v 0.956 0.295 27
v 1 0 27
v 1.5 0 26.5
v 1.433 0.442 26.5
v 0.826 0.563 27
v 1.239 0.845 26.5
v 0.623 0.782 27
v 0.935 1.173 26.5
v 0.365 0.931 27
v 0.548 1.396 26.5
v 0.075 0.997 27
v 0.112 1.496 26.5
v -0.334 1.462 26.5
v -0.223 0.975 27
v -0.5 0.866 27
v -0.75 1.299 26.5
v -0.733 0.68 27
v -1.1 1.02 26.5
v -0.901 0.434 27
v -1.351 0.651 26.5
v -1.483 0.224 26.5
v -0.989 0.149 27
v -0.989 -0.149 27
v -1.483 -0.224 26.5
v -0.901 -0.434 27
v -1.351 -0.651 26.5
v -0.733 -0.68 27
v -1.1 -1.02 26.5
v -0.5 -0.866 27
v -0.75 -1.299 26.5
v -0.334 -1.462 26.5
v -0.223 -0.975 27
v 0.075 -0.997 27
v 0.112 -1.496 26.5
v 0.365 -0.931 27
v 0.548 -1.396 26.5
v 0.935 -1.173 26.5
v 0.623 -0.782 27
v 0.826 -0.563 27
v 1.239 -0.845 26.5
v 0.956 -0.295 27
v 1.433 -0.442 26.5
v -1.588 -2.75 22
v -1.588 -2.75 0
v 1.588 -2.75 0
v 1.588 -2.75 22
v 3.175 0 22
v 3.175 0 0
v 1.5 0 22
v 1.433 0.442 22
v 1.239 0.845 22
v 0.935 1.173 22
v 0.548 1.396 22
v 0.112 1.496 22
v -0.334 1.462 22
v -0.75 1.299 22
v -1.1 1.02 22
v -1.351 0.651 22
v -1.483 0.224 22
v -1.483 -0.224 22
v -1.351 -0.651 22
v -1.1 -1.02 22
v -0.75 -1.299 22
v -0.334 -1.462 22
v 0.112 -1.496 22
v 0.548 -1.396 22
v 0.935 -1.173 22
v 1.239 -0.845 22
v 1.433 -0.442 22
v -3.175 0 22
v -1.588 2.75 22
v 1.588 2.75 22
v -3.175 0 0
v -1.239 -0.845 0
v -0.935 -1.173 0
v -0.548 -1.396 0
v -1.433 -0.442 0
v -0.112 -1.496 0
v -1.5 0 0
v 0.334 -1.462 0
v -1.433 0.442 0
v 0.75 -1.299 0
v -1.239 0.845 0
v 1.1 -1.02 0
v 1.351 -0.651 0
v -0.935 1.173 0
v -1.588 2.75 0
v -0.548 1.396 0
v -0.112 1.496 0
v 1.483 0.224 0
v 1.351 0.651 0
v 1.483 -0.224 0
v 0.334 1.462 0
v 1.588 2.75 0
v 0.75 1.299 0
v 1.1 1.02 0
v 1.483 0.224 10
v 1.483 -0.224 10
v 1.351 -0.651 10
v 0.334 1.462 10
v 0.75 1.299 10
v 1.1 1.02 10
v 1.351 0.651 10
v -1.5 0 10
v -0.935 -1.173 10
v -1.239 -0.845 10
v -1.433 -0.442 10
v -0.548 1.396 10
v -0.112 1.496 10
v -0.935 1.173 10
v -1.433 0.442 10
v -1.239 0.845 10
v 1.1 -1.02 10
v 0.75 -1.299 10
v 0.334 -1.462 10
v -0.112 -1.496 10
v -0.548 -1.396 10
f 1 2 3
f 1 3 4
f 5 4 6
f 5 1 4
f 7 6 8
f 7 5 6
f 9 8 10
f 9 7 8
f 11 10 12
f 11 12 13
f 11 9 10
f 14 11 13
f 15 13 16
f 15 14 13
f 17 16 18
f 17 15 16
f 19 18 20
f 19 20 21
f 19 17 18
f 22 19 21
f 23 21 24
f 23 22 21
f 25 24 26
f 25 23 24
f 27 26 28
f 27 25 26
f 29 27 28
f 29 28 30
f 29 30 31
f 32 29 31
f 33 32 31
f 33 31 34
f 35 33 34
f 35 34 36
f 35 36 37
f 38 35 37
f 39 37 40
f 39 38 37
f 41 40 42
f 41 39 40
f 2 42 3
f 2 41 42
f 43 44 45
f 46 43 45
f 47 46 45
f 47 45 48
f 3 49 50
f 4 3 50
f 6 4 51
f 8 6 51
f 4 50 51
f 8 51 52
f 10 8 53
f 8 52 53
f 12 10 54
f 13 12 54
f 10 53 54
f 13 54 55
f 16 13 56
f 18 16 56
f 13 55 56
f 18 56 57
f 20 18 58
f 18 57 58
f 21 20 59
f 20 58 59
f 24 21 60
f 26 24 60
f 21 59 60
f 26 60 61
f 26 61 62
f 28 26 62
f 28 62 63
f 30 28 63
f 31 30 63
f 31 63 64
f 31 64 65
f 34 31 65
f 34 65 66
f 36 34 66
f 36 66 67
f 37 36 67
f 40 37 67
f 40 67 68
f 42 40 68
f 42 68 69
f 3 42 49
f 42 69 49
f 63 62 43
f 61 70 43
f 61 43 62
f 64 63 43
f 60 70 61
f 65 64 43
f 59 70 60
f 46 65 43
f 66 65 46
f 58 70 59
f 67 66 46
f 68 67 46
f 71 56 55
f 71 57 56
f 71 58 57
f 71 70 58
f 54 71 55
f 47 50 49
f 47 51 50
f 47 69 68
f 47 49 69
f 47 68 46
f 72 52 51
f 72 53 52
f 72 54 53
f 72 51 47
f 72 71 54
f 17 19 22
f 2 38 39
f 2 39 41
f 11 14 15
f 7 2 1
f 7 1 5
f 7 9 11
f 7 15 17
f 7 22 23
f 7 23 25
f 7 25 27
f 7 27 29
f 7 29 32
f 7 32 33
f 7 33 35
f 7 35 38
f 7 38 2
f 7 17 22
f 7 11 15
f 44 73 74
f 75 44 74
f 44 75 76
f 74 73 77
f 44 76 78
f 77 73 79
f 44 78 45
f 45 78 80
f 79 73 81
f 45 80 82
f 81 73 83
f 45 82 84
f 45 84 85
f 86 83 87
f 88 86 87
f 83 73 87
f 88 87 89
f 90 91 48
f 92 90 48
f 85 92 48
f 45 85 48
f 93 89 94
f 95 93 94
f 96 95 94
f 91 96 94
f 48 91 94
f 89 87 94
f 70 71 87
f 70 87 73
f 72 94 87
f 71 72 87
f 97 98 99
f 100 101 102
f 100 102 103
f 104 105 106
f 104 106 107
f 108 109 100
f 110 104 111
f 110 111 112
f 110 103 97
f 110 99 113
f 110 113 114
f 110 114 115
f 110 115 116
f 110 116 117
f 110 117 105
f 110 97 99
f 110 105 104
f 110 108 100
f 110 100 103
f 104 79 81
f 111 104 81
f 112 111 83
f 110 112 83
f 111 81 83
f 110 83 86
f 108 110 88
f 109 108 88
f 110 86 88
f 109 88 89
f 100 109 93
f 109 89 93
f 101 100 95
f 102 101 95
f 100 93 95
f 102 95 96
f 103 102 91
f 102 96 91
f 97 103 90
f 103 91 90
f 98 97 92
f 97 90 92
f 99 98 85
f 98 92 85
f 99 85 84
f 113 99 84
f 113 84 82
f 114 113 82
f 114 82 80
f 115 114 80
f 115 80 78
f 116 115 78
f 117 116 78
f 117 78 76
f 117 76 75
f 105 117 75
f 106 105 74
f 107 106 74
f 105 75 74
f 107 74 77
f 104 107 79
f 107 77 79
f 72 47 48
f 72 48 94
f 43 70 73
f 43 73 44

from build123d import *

# Parameters (mm, degrees)
EXTRUDE_1_DEPTH     = 22
SKETCH_2_R          = 1.5
EXTRUDE_2_DEPTH     = 5
CHAMFER_1_SIZE      = 0.5
SKETCH_3_R          = 1.5
CUT_EXTRUDE_1_DEPTH = 10


with BuildPart() as part:
    # 草图1 → 凸台-拉伸1 (new body)
    with BuildSketch(Plane.XY):
        Polygon((3.175426481, 0), (1.58771324, 2.75), (-1.58771324, 2.75), (-3.175426481, 0), (-1.58771324, -2.75), (1.58771324, -2.75), align=None)
    extrude(amount=EXTRUDE_1_DEPTH)

    # 草图2 → 凸台-拉伸2 (add)
    with BuildSketch(Plane.XY.offset(22)):
        Circle(SKETCH_2_R)
    extrude(amount=EXTRUDE_2_DEPTH)

    # 倒角1
    chamfer_1_edges = [part.edges().sort_by_distance(p)[0] for p in [
        (-1.5, 0, 27),
    ]]
    chamfer(chamfer_1_edges, length=CHAMFER_1_SIZE)

    # 草图3 → 切除-拉伸1 (cut)
    with BuildSketch(Plane(origin=(0, 0, 0), x_dir=(-1, 0, 0), z_dir=(0, 0, -1))):
        Circle(SKETCH_3_R)
    extrude(amount=-CUT_EXTRUDE_1_DEPTH, mode=Mode.SUBTRACT)


solid = part.part
